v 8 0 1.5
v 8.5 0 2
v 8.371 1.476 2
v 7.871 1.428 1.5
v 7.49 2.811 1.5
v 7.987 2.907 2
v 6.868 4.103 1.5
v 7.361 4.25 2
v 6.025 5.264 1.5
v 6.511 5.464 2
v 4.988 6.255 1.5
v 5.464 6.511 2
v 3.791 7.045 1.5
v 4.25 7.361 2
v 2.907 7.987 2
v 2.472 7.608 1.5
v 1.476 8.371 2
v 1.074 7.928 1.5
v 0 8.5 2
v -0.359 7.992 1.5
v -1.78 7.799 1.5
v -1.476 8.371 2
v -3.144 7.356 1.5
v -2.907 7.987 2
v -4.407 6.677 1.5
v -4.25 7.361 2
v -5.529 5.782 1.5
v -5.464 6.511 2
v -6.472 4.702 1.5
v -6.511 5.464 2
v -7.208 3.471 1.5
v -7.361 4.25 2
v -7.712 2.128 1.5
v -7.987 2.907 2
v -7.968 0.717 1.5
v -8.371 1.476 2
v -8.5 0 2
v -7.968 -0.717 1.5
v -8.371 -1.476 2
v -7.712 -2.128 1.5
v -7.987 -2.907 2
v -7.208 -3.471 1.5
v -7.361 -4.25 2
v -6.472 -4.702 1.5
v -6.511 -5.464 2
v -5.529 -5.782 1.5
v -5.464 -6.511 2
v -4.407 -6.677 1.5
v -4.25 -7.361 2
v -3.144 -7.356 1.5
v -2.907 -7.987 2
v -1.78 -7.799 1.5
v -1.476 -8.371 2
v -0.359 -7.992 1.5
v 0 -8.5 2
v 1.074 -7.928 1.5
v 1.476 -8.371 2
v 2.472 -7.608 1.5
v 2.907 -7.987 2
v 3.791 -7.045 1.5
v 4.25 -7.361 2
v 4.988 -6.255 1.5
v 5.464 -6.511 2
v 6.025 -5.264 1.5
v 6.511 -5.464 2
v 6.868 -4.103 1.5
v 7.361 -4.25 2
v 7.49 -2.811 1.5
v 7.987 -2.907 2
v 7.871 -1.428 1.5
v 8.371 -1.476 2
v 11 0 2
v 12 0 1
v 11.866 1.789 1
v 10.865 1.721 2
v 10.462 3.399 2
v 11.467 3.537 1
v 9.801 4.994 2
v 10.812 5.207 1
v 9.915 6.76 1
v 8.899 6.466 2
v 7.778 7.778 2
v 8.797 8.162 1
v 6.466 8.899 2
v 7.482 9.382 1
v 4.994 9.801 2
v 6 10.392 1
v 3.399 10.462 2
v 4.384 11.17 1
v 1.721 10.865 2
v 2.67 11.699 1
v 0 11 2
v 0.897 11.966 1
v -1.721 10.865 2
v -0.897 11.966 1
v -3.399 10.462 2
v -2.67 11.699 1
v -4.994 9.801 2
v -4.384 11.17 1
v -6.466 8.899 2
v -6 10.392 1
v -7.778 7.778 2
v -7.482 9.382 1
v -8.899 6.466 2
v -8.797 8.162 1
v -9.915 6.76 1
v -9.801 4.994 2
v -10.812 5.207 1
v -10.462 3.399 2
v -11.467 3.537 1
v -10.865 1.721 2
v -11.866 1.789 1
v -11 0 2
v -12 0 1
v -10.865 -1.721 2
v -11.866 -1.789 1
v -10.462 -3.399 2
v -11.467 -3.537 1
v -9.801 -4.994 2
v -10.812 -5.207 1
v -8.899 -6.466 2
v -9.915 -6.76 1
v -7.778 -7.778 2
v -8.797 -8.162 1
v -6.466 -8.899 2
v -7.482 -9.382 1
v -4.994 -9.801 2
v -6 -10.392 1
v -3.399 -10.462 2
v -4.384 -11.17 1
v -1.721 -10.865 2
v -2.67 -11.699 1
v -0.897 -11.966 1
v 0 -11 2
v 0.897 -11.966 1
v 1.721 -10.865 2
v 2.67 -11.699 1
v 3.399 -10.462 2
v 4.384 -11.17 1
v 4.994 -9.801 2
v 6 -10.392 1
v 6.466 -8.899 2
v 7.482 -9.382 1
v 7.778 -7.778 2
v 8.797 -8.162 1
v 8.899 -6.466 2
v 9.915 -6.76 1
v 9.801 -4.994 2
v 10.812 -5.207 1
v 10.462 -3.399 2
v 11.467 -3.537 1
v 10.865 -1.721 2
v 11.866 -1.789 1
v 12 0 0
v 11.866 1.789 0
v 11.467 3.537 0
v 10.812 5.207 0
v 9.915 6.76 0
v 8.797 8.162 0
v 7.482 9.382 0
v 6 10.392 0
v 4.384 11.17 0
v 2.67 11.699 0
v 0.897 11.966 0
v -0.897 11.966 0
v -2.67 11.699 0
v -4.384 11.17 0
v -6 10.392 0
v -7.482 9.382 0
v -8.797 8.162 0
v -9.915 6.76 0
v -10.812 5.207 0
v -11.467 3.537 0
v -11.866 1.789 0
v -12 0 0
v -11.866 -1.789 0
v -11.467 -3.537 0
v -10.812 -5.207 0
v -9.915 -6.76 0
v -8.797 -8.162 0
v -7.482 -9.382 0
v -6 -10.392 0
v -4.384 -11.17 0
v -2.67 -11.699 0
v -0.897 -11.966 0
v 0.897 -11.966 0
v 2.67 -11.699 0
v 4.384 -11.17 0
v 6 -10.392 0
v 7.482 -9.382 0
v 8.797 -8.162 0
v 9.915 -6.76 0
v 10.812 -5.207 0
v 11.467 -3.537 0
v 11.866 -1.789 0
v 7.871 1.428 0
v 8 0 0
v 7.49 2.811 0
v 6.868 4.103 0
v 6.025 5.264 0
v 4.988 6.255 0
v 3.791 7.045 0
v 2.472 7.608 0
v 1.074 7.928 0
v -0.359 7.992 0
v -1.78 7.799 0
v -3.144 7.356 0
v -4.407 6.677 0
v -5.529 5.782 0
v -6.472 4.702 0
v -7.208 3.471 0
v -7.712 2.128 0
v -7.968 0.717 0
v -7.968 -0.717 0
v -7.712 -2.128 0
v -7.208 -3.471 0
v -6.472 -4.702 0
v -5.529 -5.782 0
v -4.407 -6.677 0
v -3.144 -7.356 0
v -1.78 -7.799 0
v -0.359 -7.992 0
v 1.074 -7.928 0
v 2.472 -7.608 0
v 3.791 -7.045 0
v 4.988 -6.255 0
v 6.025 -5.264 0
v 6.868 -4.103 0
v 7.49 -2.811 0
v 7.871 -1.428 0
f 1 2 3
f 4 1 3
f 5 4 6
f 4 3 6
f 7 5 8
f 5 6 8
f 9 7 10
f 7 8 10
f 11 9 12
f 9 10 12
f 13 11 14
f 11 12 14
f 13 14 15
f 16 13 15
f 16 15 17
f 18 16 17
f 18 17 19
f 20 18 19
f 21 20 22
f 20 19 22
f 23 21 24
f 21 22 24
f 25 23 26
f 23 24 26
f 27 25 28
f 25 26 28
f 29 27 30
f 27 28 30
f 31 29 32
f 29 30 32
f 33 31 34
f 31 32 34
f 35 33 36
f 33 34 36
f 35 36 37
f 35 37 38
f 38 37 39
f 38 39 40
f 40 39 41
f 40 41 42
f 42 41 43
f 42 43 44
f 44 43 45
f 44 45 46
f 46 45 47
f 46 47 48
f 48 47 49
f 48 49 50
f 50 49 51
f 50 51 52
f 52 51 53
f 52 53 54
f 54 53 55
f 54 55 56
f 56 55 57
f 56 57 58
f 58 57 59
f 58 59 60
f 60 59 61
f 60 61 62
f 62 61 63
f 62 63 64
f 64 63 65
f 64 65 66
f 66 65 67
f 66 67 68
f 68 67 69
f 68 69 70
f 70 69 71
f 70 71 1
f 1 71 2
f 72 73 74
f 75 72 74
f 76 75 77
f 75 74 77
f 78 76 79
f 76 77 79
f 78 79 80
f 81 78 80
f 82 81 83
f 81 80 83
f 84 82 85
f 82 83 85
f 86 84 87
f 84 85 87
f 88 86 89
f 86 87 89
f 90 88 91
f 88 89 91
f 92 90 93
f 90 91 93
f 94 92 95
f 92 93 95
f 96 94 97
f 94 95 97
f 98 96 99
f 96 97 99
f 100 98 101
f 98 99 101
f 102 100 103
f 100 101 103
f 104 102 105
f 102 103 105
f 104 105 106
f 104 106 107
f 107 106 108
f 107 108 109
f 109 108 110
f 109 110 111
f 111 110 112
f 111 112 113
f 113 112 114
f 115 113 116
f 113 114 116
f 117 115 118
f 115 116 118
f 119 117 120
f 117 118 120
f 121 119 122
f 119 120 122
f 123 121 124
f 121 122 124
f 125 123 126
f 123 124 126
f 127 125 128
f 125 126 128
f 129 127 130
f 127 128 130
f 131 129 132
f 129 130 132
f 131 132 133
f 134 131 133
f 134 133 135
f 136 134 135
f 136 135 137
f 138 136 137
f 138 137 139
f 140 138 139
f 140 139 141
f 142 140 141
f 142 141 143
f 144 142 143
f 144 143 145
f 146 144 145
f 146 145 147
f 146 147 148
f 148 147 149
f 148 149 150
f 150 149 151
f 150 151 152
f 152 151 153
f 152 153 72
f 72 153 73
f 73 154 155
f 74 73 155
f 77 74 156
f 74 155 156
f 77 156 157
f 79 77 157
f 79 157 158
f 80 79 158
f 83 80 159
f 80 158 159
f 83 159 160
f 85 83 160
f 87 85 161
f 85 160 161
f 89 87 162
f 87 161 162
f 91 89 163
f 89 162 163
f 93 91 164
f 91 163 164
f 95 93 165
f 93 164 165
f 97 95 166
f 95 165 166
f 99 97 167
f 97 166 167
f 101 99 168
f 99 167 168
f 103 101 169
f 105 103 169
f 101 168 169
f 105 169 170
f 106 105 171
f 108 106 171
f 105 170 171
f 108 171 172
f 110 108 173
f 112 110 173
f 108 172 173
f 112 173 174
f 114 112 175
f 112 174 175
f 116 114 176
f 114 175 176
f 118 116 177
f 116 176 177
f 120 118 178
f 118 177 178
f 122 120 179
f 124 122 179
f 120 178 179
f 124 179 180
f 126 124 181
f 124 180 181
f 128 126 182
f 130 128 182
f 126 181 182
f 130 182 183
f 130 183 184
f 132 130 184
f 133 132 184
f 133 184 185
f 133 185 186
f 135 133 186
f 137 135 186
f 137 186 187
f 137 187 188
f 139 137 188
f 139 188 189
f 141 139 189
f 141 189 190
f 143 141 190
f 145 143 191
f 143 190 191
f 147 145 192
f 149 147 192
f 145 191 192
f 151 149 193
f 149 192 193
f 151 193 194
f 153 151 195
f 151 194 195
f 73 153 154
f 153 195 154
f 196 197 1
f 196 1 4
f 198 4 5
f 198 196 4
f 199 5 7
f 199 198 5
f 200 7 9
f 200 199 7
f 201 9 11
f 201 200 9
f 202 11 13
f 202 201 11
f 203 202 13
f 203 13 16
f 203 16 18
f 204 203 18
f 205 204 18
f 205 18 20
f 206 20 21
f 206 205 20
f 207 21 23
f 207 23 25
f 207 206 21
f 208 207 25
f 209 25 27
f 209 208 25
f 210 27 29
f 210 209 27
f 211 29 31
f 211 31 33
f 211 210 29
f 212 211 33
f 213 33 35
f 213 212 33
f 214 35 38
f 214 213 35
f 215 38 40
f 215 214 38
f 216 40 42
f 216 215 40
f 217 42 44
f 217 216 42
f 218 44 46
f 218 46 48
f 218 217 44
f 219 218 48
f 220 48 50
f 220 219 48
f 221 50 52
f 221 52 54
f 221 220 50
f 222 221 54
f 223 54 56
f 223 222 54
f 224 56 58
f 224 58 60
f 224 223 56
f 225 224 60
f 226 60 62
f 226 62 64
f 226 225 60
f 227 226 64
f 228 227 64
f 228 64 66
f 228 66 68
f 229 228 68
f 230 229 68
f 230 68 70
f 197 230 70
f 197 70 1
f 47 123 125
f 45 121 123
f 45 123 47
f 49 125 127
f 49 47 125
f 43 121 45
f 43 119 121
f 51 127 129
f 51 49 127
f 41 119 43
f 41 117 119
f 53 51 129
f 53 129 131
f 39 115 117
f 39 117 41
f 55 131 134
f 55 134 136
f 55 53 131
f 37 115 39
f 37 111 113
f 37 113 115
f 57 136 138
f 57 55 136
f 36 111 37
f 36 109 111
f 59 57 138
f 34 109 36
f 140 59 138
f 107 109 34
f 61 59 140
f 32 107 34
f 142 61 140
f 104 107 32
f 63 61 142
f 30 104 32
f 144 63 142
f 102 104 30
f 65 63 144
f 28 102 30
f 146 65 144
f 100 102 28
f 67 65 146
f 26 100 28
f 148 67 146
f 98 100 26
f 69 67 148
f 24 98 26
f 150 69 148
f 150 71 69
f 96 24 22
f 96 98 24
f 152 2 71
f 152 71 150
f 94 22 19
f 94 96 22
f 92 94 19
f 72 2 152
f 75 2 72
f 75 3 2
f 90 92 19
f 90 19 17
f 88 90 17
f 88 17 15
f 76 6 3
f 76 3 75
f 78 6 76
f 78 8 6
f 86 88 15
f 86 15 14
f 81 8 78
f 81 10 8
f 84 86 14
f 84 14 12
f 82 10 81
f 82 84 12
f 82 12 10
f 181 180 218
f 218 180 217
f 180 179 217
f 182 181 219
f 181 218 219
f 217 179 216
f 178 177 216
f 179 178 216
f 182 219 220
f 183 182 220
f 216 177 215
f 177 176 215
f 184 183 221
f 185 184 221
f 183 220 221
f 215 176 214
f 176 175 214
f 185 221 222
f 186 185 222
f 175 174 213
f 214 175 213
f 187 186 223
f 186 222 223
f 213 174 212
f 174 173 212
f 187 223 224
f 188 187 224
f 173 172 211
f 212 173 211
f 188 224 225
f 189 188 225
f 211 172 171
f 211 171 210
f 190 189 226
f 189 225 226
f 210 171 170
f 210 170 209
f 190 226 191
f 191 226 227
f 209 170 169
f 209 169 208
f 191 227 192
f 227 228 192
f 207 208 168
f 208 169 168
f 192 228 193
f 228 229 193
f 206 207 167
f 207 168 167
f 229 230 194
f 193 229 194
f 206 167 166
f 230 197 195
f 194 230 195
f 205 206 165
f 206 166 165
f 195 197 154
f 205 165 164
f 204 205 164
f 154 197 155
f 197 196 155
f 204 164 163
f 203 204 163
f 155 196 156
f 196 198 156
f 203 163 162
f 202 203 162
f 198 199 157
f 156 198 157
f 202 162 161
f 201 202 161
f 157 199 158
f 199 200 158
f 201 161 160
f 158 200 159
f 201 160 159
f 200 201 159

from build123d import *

# Parameters (mm, degrees)
SKETCH_R        = 12
SKETCH_R_2      = 8
PAD_DEPTH       = 2
CHAMFER_SIZE    = 0.5
CHAMFER001_SIZE = 1


with BuildPart() as part:
    # Sketch → Pad (new body)
    with BuildSketch(Plane.XY):
        Circle(SKETCH_R)
        Circle(SKETCH_R_2, mode=Mode.SUBTRACT)
    extrude(amount=PAD_DEPTH)

    # Chamfer
    chamfer_edges = [part.edges().sort_by_distance(p)[0] for p in [
        (-8, 0, 2),
    ]]
    chamfer(chamfer_edges, length=CHAMFER_SIZE)

    # Chamfer001
    chamfer001_edges = [part.edges().sort_by_distance(p)[0] for p in [
        (-12, 0, 2),
    ]]
    chamfer(chamfer001_edges, length=CHAMFER001_SIZE)


solid = part.part
